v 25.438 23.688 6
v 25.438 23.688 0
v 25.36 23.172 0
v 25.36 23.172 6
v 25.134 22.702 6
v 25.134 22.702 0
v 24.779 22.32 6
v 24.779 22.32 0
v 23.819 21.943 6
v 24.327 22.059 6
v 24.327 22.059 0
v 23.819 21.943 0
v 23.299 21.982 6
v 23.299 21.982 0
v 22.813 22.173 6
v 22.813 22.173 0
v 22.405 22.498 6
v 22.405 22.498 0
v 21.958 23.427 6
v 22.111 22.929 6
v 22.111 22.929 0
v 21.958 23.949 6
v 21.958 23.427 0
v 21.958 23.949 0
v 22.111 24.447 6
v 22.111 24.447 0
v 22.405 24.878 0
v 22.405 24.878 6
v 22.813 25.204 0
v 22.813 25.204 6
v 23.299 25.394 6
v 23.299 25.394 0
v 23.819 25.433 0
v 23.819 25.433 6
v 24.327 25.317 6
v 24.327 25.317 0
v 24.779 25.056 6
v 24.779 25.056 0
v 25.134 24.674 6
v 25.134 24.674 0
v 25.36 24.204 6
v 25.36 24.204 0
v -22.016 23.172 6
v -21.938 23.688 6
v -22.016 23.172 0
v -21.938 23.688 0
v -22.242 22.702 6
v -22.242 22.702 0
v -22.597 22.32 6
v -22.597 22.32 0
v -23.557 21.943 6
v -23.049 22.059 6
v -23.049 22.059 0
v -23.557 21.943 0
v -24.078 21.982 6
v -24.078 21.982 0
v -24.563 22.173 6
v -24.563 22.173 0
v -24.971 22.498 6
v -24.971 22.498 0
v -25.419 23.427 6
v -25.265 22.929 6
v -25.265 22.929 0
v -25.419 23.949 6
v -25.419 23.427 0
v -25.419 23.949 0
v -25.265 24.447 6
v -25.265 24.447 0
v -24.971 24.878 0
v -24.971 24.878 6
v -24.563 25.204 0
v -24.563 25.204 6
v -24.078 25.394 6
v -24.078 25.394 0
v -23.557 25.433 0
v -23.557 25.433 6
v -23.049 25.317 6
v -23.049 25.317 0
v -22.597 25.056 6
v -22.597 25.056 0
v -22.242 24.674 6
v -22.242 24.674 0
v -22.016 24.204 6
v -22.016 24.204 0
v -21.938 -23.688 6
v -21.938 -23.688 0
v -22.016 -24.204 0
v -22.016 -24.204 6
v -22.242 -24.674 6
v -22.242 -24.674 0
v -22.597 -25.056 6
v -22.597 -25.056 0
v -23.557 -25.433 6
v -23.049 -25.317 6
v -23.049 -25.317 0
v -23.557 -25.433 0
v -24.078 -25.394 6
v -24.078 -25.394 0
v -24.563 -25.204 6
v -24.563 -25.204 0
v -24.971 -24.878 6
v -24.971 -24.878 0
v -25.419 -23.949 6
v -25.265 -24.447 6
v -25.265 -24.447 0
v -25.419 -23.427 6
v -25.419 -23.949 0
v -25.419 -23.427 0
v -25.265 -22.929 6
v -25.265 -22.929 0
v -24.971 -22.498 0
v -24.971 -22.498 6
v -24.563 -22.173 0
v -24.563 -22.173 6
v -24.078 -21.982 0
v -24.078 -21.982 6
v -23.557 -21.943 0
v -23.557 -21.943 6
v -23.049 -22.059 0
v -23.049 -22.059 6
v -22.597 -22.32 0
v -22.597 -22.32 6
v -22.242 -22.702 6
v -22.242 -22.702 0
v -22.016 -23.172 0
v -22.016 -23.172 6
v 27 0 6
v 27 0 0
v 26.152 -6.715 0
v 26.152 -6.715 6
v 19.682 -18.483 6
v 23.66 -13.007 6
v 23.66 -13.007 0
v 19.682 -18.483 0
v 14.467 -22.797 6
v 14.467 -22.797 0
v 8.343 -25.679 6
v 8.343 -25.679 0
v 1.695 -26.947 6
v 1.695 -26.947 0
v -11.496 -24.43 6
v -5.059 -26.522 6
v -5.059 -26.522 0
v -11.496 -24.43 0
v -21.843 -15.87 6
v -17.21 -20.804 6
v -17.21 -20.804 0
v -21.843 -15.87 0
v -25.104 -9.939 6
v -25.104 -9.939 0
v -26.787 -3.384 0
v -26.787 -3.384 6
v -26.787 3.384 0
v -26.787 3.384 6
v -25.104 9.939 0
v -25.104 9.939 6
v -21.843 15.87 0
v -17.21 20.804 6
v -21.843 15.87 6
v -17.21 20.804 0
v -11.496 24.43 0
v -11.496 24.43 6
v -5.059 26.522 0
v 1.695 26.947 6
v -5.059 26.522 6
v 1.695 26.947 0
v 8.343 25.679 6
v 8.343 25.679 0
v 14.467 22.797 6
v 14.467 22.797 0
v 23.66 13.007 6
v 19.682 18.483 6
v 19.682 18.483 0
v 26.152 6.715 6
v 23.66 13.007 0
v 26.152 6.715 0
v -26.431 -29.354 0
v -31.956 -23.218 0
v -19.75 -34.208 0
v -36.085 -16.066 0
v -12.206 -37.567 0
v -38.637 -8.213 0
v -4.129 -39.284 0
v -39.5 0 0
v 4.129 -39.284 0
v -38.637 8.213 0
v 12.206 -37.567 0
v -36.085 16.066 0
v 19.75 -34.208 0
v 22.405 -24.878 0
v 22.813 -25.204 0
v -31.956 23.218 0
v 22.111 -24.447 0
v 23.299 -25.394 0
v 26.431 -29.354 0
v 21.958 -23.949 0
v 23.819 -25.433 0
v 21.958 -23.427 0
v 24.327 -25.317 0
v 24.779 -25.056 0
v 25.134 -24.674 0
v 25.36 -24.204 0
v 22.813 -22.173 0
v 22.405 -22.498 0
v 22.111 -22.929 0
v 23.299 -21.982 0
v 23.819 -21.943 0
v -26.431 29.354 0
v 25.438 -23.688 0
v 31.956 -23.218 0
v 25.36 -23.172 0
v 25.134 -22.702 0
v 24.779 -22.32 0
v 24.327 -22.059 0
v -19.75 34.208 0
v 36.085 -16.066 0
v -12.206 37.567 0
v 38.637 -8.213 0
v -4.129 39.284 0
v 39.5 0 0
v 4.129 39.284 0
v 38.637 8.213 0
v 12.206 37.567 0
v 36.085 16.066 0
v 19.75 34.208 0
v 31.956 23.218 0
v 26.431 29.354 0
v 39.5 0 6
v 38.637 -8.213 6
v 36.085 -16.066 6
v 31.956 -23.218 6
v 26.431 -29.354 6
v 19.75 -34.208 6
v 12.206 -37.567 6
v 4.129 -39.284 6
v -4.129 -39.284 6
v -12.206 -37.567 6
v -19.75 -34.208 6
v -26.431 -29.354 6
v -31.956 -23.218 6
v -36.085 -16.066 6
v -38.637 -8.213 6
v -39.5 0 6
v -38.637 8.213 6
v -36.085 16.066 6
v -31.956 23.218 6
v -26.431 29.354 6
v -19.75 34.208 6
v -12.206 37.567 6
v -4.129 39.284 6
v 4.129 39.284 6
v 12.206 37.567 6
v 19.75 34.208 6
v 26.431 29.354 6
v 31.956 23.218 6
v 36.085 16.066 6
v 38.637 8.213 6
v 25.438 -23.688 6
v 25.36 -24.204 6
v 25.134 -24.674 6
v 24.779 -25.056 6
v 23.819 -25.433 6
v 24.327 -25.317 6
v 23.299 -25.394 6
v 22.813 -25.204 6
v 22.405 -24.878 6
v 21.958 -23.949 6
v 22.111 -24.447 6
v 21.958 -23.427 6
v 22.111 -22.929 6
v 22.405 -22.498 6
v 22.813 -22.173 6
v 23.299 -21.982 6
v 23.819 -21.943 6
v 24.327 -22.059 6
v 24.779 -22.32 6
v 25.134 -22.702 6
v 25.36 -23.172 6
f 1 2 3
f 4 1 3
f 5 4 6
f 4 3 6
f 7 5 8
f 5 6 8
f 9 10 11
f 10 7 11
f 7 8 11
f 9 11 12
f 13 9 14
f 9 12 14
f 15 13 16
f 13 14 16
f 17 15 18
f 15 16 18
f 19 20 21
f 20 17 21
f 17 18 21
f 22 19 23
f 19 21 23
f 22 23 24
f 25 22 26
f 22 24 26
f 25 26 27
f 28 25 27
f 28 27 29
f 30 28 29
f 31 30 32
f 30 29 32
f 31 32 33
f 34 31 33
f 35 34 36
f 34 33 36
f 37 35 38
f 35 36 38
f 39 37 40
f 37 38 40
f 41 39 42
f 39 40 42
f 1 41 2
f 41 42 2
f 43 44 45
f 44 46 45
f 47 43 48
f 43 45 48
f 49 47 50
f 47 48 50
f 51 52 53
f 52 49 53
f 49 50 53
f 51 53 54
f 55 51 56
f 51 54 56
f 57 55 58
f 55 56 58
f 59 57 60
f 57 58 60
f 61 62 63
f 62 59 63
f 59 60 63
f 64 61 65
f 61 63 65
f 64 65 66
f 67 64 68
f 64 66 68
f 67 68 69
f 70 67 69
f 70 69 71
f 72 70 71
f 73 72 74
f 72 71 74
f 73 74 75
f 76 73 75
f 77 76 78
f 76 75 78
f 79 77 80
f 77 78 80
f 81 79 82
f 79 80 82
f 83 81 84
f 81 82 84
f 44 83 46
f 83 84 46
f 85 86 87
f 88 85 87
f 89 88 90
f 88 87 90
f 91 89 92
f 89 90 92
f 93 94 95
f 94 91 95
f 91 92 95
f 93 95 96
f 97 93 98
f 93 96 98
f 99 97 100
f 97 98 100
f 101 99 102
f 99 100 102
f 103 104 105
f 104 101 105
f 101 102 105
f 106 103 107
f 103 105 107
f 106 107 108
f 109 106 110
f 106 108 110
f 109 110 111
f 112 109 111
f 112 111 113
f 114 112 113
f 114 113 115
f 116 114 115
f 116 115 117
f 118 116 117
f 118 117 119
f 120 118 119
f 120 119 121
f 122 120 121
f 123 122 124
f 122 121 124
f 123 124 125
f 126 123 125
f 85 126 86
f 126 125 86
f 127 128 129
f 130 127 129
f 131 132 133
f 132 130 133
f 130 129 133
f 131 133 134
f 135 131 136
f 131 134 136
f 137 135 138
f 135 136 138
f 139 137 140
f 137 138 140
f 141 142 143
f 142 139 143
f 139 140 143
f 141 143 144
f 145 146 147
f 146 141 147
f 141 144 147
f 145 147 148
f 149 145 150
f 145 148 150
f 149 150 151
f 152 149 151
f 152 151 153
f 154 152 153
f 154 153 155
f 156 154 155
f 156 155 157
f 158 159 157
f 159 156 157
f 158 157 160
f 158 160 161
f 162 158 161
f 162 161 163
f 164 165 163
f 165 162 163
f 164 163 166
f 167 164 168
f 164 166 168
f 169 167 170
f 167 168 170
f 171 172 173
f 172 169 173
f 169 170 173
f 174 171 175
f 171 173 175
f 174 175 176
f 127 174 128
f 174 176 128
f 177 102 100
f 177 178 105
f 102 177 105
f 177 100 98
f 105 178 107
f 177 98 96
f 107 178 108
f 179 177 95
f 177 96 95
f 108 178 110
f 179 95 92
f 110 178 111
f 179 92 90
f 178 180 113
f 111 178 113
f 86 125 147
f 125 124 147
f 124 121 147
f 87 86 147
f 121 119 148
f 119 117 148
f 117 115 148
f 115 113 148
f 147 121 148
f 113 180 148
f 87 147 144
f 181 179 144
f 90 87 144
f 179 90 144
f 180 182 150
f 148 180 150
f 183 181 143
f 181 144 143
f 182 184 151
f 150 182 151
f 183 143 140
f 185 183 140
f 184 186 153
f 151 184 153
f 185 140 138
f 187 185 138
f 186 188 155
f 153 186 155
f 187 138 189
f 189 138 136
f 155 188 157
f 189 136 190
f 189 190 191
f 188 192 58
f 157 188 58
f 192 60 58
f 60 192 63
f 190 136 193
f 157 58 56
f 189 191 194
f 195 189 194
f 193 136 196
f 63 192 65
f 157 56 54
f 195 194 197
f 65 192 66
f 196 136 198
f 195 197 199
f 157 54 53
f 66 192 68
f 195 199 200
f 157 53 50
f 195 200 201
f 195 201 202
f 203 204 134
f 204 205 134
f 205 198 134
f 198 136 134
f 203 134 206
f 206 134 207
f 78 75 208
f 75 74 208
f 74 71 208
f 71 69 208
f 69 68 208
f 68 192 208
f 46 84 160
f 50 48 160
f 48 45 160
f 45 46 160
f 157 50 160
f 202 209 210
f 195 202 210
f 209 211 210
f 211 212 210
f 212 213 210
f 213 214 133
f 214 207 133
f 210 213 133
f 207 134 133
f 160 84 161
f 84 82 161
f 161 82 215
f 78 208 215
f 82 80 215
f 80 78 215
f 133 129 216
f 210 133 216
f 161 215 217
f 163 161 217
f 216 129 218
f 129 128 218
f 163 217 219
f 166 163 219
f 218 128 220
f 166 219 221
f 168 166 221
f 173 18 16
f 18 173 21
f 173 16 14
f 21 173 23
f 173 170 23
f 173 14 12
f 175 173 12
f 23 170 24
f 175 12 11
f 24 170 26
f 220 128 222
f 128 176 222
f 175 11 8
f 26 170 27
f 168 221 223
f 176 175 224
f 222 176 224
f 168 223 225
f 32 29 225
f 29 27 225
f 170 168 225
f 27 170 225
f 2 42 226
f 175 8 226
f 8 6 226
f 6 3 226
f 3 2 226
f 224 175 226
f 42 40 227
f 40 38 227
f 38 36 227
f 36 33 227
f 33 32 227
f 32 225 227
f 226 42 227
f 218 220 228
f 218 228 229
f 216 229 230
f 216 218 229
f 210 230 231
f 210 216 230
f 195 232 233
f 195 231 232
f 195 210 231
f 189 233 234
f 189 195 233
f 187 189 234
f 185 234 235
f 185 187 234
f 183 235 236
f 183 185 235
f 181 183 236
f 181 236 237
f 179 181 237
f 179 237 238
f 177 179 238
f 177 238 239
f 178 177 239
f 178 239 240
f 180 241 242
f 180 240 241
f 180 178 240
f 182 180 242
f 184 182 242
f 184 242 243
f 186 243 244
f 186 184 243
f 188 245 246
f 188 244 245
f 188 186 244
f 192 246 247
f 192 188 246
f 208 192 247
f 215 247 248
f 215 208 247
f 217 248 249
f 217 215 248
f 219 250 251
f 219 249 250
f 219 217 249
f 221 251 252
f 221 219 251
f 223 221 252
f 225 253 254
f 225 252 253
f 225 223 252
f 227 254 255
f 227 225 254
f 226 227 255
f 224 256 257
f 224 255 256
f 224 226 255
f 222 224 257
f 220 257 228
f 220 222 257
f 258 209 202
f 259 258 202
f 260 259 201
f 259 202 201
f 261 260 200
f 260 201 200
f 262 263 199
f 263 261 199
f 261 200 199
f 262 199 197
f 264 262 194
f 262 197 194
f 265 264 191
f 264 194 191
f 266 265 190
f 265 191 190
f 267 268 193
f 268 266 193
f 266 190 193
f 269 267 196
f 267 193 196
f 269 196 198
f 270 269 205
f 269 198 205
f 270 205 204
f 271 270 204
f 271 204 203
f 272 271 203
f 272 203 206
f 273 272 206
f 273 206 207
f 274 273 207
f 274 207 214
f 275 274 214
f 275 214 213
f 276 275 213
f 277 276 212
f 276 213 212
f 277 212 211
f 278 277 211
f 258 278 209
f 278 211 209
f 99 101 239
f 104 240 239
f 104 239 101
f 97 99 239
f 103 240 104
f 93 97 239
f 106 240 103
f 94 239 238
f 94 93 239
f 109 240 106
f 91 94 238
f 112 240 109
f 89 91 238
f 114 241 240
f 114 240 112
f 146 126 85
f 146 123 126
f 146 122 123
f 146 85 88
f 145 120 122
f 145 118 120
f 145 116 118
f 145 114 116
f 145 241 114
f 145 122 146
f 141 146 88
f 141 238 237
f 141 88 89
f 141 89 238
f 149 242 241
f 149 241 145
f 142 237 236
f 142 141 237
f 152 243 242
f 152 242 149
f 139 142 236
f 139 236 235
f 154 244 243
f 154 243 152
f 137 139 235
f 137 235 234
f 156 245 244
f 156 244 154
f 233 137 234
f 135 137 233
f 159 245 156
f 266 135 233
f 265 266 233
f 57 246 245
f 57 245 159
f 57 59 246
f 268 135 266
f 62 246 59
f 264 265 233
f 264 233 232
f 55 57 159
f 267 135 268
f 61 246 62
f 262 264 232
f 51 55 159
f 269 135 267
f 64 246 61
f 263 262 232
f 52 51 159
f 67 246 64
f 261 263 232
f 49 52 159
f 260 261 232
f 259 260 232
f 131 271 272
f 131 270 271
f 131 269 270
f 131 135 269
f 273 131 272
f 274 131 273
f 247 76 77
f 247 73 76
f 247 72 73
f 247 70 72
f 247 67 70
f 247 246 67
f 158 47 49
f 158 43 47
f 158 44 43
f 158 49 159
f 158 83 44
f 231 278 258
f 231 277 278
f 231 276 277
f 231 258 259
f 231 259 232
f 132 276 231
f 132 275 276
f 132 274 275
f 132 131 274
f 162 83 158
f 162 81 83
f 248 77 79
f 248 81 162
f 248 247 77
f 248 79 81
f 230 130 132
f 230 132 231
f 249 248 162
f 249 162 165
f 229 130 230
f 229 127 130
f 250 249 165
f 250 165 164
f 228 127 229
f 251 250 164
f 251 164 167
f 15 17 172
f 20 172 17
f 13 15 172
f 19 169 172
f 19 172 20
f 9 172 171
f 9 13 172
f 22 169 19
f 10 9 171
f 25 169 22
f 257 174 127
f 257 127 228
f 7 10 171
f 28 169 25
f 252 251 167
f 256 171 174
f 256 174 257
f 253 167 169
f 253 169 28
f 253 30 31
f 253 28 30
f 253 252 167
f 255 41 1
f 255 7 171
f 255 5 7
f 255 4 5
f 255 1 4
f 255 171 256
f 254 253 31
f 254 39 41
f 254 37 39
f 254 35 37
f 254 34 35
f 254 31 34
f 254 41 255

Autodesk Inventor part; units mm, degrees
ref_plane "YZ Plane" through (0, 0, 0) normal (1, 0, 0) x (0, 1, 0)
ref_plane "XZ Plane" through (0, 0, 0) normal (0, 1, 0) x (-1, 0, 0)
ref_plane "XY Plane" through (0, 0, 0) normal (0, 0, 1) x (1, 0, 0)
sketch "Sketch8" plane through (0, 0, 0) normal (0, 0, 1) x (1, 0, 0)
  circle A0 centre (0, 0) radius 39.5
  circle A1 centre (0, 0) radius 27
  line L0 (-23.6881, -23.6881) -> (23.6881, -23.6881) construction
  line L1 (23.6881, -23.6881) -> (23.6881, 23.6881) construction
  line L2 (23.6881, 23.6881) -> (-23.6881, 23.6881) construction
  line L3 (-23.6881, 23.6881) -> (-23.6881, -23.6881) construction
  line L4 (-23.6881, -23.6881) -> (23.6881, 23.6881) construction
  line L5 (23.6881, -23.6881) -> (-23.6881, 23.6881) construction
  circle A2 centre (-23.6881, 23.6881) radius 1.75
  circle A3 centre (23.6881, 23.6881) radius 1.75
  circle A4 centre (-23.6881, -23.6881) radius 1.75
  circle A5 centre (23.6881, -23.6881) radius 1.75
  dimension "d23" = 79
  dimension "d24" = 54
  dimension "d25" = 67
  dimension "d26" = 3.5
  dimension "d27" = 3.5
  dimension "d28" = 3.5
  dimension "d29" = 3.5
extrude "Extrusion8" add sketch "Sketch8" along normal blind 6
equation "\"d27\" = d26"
equation "\"d28\" = d26"
equation "\"d29\" = d26"
properties part number "2209B_Tube Flange Inner_V1" material "ABS Plastic"
